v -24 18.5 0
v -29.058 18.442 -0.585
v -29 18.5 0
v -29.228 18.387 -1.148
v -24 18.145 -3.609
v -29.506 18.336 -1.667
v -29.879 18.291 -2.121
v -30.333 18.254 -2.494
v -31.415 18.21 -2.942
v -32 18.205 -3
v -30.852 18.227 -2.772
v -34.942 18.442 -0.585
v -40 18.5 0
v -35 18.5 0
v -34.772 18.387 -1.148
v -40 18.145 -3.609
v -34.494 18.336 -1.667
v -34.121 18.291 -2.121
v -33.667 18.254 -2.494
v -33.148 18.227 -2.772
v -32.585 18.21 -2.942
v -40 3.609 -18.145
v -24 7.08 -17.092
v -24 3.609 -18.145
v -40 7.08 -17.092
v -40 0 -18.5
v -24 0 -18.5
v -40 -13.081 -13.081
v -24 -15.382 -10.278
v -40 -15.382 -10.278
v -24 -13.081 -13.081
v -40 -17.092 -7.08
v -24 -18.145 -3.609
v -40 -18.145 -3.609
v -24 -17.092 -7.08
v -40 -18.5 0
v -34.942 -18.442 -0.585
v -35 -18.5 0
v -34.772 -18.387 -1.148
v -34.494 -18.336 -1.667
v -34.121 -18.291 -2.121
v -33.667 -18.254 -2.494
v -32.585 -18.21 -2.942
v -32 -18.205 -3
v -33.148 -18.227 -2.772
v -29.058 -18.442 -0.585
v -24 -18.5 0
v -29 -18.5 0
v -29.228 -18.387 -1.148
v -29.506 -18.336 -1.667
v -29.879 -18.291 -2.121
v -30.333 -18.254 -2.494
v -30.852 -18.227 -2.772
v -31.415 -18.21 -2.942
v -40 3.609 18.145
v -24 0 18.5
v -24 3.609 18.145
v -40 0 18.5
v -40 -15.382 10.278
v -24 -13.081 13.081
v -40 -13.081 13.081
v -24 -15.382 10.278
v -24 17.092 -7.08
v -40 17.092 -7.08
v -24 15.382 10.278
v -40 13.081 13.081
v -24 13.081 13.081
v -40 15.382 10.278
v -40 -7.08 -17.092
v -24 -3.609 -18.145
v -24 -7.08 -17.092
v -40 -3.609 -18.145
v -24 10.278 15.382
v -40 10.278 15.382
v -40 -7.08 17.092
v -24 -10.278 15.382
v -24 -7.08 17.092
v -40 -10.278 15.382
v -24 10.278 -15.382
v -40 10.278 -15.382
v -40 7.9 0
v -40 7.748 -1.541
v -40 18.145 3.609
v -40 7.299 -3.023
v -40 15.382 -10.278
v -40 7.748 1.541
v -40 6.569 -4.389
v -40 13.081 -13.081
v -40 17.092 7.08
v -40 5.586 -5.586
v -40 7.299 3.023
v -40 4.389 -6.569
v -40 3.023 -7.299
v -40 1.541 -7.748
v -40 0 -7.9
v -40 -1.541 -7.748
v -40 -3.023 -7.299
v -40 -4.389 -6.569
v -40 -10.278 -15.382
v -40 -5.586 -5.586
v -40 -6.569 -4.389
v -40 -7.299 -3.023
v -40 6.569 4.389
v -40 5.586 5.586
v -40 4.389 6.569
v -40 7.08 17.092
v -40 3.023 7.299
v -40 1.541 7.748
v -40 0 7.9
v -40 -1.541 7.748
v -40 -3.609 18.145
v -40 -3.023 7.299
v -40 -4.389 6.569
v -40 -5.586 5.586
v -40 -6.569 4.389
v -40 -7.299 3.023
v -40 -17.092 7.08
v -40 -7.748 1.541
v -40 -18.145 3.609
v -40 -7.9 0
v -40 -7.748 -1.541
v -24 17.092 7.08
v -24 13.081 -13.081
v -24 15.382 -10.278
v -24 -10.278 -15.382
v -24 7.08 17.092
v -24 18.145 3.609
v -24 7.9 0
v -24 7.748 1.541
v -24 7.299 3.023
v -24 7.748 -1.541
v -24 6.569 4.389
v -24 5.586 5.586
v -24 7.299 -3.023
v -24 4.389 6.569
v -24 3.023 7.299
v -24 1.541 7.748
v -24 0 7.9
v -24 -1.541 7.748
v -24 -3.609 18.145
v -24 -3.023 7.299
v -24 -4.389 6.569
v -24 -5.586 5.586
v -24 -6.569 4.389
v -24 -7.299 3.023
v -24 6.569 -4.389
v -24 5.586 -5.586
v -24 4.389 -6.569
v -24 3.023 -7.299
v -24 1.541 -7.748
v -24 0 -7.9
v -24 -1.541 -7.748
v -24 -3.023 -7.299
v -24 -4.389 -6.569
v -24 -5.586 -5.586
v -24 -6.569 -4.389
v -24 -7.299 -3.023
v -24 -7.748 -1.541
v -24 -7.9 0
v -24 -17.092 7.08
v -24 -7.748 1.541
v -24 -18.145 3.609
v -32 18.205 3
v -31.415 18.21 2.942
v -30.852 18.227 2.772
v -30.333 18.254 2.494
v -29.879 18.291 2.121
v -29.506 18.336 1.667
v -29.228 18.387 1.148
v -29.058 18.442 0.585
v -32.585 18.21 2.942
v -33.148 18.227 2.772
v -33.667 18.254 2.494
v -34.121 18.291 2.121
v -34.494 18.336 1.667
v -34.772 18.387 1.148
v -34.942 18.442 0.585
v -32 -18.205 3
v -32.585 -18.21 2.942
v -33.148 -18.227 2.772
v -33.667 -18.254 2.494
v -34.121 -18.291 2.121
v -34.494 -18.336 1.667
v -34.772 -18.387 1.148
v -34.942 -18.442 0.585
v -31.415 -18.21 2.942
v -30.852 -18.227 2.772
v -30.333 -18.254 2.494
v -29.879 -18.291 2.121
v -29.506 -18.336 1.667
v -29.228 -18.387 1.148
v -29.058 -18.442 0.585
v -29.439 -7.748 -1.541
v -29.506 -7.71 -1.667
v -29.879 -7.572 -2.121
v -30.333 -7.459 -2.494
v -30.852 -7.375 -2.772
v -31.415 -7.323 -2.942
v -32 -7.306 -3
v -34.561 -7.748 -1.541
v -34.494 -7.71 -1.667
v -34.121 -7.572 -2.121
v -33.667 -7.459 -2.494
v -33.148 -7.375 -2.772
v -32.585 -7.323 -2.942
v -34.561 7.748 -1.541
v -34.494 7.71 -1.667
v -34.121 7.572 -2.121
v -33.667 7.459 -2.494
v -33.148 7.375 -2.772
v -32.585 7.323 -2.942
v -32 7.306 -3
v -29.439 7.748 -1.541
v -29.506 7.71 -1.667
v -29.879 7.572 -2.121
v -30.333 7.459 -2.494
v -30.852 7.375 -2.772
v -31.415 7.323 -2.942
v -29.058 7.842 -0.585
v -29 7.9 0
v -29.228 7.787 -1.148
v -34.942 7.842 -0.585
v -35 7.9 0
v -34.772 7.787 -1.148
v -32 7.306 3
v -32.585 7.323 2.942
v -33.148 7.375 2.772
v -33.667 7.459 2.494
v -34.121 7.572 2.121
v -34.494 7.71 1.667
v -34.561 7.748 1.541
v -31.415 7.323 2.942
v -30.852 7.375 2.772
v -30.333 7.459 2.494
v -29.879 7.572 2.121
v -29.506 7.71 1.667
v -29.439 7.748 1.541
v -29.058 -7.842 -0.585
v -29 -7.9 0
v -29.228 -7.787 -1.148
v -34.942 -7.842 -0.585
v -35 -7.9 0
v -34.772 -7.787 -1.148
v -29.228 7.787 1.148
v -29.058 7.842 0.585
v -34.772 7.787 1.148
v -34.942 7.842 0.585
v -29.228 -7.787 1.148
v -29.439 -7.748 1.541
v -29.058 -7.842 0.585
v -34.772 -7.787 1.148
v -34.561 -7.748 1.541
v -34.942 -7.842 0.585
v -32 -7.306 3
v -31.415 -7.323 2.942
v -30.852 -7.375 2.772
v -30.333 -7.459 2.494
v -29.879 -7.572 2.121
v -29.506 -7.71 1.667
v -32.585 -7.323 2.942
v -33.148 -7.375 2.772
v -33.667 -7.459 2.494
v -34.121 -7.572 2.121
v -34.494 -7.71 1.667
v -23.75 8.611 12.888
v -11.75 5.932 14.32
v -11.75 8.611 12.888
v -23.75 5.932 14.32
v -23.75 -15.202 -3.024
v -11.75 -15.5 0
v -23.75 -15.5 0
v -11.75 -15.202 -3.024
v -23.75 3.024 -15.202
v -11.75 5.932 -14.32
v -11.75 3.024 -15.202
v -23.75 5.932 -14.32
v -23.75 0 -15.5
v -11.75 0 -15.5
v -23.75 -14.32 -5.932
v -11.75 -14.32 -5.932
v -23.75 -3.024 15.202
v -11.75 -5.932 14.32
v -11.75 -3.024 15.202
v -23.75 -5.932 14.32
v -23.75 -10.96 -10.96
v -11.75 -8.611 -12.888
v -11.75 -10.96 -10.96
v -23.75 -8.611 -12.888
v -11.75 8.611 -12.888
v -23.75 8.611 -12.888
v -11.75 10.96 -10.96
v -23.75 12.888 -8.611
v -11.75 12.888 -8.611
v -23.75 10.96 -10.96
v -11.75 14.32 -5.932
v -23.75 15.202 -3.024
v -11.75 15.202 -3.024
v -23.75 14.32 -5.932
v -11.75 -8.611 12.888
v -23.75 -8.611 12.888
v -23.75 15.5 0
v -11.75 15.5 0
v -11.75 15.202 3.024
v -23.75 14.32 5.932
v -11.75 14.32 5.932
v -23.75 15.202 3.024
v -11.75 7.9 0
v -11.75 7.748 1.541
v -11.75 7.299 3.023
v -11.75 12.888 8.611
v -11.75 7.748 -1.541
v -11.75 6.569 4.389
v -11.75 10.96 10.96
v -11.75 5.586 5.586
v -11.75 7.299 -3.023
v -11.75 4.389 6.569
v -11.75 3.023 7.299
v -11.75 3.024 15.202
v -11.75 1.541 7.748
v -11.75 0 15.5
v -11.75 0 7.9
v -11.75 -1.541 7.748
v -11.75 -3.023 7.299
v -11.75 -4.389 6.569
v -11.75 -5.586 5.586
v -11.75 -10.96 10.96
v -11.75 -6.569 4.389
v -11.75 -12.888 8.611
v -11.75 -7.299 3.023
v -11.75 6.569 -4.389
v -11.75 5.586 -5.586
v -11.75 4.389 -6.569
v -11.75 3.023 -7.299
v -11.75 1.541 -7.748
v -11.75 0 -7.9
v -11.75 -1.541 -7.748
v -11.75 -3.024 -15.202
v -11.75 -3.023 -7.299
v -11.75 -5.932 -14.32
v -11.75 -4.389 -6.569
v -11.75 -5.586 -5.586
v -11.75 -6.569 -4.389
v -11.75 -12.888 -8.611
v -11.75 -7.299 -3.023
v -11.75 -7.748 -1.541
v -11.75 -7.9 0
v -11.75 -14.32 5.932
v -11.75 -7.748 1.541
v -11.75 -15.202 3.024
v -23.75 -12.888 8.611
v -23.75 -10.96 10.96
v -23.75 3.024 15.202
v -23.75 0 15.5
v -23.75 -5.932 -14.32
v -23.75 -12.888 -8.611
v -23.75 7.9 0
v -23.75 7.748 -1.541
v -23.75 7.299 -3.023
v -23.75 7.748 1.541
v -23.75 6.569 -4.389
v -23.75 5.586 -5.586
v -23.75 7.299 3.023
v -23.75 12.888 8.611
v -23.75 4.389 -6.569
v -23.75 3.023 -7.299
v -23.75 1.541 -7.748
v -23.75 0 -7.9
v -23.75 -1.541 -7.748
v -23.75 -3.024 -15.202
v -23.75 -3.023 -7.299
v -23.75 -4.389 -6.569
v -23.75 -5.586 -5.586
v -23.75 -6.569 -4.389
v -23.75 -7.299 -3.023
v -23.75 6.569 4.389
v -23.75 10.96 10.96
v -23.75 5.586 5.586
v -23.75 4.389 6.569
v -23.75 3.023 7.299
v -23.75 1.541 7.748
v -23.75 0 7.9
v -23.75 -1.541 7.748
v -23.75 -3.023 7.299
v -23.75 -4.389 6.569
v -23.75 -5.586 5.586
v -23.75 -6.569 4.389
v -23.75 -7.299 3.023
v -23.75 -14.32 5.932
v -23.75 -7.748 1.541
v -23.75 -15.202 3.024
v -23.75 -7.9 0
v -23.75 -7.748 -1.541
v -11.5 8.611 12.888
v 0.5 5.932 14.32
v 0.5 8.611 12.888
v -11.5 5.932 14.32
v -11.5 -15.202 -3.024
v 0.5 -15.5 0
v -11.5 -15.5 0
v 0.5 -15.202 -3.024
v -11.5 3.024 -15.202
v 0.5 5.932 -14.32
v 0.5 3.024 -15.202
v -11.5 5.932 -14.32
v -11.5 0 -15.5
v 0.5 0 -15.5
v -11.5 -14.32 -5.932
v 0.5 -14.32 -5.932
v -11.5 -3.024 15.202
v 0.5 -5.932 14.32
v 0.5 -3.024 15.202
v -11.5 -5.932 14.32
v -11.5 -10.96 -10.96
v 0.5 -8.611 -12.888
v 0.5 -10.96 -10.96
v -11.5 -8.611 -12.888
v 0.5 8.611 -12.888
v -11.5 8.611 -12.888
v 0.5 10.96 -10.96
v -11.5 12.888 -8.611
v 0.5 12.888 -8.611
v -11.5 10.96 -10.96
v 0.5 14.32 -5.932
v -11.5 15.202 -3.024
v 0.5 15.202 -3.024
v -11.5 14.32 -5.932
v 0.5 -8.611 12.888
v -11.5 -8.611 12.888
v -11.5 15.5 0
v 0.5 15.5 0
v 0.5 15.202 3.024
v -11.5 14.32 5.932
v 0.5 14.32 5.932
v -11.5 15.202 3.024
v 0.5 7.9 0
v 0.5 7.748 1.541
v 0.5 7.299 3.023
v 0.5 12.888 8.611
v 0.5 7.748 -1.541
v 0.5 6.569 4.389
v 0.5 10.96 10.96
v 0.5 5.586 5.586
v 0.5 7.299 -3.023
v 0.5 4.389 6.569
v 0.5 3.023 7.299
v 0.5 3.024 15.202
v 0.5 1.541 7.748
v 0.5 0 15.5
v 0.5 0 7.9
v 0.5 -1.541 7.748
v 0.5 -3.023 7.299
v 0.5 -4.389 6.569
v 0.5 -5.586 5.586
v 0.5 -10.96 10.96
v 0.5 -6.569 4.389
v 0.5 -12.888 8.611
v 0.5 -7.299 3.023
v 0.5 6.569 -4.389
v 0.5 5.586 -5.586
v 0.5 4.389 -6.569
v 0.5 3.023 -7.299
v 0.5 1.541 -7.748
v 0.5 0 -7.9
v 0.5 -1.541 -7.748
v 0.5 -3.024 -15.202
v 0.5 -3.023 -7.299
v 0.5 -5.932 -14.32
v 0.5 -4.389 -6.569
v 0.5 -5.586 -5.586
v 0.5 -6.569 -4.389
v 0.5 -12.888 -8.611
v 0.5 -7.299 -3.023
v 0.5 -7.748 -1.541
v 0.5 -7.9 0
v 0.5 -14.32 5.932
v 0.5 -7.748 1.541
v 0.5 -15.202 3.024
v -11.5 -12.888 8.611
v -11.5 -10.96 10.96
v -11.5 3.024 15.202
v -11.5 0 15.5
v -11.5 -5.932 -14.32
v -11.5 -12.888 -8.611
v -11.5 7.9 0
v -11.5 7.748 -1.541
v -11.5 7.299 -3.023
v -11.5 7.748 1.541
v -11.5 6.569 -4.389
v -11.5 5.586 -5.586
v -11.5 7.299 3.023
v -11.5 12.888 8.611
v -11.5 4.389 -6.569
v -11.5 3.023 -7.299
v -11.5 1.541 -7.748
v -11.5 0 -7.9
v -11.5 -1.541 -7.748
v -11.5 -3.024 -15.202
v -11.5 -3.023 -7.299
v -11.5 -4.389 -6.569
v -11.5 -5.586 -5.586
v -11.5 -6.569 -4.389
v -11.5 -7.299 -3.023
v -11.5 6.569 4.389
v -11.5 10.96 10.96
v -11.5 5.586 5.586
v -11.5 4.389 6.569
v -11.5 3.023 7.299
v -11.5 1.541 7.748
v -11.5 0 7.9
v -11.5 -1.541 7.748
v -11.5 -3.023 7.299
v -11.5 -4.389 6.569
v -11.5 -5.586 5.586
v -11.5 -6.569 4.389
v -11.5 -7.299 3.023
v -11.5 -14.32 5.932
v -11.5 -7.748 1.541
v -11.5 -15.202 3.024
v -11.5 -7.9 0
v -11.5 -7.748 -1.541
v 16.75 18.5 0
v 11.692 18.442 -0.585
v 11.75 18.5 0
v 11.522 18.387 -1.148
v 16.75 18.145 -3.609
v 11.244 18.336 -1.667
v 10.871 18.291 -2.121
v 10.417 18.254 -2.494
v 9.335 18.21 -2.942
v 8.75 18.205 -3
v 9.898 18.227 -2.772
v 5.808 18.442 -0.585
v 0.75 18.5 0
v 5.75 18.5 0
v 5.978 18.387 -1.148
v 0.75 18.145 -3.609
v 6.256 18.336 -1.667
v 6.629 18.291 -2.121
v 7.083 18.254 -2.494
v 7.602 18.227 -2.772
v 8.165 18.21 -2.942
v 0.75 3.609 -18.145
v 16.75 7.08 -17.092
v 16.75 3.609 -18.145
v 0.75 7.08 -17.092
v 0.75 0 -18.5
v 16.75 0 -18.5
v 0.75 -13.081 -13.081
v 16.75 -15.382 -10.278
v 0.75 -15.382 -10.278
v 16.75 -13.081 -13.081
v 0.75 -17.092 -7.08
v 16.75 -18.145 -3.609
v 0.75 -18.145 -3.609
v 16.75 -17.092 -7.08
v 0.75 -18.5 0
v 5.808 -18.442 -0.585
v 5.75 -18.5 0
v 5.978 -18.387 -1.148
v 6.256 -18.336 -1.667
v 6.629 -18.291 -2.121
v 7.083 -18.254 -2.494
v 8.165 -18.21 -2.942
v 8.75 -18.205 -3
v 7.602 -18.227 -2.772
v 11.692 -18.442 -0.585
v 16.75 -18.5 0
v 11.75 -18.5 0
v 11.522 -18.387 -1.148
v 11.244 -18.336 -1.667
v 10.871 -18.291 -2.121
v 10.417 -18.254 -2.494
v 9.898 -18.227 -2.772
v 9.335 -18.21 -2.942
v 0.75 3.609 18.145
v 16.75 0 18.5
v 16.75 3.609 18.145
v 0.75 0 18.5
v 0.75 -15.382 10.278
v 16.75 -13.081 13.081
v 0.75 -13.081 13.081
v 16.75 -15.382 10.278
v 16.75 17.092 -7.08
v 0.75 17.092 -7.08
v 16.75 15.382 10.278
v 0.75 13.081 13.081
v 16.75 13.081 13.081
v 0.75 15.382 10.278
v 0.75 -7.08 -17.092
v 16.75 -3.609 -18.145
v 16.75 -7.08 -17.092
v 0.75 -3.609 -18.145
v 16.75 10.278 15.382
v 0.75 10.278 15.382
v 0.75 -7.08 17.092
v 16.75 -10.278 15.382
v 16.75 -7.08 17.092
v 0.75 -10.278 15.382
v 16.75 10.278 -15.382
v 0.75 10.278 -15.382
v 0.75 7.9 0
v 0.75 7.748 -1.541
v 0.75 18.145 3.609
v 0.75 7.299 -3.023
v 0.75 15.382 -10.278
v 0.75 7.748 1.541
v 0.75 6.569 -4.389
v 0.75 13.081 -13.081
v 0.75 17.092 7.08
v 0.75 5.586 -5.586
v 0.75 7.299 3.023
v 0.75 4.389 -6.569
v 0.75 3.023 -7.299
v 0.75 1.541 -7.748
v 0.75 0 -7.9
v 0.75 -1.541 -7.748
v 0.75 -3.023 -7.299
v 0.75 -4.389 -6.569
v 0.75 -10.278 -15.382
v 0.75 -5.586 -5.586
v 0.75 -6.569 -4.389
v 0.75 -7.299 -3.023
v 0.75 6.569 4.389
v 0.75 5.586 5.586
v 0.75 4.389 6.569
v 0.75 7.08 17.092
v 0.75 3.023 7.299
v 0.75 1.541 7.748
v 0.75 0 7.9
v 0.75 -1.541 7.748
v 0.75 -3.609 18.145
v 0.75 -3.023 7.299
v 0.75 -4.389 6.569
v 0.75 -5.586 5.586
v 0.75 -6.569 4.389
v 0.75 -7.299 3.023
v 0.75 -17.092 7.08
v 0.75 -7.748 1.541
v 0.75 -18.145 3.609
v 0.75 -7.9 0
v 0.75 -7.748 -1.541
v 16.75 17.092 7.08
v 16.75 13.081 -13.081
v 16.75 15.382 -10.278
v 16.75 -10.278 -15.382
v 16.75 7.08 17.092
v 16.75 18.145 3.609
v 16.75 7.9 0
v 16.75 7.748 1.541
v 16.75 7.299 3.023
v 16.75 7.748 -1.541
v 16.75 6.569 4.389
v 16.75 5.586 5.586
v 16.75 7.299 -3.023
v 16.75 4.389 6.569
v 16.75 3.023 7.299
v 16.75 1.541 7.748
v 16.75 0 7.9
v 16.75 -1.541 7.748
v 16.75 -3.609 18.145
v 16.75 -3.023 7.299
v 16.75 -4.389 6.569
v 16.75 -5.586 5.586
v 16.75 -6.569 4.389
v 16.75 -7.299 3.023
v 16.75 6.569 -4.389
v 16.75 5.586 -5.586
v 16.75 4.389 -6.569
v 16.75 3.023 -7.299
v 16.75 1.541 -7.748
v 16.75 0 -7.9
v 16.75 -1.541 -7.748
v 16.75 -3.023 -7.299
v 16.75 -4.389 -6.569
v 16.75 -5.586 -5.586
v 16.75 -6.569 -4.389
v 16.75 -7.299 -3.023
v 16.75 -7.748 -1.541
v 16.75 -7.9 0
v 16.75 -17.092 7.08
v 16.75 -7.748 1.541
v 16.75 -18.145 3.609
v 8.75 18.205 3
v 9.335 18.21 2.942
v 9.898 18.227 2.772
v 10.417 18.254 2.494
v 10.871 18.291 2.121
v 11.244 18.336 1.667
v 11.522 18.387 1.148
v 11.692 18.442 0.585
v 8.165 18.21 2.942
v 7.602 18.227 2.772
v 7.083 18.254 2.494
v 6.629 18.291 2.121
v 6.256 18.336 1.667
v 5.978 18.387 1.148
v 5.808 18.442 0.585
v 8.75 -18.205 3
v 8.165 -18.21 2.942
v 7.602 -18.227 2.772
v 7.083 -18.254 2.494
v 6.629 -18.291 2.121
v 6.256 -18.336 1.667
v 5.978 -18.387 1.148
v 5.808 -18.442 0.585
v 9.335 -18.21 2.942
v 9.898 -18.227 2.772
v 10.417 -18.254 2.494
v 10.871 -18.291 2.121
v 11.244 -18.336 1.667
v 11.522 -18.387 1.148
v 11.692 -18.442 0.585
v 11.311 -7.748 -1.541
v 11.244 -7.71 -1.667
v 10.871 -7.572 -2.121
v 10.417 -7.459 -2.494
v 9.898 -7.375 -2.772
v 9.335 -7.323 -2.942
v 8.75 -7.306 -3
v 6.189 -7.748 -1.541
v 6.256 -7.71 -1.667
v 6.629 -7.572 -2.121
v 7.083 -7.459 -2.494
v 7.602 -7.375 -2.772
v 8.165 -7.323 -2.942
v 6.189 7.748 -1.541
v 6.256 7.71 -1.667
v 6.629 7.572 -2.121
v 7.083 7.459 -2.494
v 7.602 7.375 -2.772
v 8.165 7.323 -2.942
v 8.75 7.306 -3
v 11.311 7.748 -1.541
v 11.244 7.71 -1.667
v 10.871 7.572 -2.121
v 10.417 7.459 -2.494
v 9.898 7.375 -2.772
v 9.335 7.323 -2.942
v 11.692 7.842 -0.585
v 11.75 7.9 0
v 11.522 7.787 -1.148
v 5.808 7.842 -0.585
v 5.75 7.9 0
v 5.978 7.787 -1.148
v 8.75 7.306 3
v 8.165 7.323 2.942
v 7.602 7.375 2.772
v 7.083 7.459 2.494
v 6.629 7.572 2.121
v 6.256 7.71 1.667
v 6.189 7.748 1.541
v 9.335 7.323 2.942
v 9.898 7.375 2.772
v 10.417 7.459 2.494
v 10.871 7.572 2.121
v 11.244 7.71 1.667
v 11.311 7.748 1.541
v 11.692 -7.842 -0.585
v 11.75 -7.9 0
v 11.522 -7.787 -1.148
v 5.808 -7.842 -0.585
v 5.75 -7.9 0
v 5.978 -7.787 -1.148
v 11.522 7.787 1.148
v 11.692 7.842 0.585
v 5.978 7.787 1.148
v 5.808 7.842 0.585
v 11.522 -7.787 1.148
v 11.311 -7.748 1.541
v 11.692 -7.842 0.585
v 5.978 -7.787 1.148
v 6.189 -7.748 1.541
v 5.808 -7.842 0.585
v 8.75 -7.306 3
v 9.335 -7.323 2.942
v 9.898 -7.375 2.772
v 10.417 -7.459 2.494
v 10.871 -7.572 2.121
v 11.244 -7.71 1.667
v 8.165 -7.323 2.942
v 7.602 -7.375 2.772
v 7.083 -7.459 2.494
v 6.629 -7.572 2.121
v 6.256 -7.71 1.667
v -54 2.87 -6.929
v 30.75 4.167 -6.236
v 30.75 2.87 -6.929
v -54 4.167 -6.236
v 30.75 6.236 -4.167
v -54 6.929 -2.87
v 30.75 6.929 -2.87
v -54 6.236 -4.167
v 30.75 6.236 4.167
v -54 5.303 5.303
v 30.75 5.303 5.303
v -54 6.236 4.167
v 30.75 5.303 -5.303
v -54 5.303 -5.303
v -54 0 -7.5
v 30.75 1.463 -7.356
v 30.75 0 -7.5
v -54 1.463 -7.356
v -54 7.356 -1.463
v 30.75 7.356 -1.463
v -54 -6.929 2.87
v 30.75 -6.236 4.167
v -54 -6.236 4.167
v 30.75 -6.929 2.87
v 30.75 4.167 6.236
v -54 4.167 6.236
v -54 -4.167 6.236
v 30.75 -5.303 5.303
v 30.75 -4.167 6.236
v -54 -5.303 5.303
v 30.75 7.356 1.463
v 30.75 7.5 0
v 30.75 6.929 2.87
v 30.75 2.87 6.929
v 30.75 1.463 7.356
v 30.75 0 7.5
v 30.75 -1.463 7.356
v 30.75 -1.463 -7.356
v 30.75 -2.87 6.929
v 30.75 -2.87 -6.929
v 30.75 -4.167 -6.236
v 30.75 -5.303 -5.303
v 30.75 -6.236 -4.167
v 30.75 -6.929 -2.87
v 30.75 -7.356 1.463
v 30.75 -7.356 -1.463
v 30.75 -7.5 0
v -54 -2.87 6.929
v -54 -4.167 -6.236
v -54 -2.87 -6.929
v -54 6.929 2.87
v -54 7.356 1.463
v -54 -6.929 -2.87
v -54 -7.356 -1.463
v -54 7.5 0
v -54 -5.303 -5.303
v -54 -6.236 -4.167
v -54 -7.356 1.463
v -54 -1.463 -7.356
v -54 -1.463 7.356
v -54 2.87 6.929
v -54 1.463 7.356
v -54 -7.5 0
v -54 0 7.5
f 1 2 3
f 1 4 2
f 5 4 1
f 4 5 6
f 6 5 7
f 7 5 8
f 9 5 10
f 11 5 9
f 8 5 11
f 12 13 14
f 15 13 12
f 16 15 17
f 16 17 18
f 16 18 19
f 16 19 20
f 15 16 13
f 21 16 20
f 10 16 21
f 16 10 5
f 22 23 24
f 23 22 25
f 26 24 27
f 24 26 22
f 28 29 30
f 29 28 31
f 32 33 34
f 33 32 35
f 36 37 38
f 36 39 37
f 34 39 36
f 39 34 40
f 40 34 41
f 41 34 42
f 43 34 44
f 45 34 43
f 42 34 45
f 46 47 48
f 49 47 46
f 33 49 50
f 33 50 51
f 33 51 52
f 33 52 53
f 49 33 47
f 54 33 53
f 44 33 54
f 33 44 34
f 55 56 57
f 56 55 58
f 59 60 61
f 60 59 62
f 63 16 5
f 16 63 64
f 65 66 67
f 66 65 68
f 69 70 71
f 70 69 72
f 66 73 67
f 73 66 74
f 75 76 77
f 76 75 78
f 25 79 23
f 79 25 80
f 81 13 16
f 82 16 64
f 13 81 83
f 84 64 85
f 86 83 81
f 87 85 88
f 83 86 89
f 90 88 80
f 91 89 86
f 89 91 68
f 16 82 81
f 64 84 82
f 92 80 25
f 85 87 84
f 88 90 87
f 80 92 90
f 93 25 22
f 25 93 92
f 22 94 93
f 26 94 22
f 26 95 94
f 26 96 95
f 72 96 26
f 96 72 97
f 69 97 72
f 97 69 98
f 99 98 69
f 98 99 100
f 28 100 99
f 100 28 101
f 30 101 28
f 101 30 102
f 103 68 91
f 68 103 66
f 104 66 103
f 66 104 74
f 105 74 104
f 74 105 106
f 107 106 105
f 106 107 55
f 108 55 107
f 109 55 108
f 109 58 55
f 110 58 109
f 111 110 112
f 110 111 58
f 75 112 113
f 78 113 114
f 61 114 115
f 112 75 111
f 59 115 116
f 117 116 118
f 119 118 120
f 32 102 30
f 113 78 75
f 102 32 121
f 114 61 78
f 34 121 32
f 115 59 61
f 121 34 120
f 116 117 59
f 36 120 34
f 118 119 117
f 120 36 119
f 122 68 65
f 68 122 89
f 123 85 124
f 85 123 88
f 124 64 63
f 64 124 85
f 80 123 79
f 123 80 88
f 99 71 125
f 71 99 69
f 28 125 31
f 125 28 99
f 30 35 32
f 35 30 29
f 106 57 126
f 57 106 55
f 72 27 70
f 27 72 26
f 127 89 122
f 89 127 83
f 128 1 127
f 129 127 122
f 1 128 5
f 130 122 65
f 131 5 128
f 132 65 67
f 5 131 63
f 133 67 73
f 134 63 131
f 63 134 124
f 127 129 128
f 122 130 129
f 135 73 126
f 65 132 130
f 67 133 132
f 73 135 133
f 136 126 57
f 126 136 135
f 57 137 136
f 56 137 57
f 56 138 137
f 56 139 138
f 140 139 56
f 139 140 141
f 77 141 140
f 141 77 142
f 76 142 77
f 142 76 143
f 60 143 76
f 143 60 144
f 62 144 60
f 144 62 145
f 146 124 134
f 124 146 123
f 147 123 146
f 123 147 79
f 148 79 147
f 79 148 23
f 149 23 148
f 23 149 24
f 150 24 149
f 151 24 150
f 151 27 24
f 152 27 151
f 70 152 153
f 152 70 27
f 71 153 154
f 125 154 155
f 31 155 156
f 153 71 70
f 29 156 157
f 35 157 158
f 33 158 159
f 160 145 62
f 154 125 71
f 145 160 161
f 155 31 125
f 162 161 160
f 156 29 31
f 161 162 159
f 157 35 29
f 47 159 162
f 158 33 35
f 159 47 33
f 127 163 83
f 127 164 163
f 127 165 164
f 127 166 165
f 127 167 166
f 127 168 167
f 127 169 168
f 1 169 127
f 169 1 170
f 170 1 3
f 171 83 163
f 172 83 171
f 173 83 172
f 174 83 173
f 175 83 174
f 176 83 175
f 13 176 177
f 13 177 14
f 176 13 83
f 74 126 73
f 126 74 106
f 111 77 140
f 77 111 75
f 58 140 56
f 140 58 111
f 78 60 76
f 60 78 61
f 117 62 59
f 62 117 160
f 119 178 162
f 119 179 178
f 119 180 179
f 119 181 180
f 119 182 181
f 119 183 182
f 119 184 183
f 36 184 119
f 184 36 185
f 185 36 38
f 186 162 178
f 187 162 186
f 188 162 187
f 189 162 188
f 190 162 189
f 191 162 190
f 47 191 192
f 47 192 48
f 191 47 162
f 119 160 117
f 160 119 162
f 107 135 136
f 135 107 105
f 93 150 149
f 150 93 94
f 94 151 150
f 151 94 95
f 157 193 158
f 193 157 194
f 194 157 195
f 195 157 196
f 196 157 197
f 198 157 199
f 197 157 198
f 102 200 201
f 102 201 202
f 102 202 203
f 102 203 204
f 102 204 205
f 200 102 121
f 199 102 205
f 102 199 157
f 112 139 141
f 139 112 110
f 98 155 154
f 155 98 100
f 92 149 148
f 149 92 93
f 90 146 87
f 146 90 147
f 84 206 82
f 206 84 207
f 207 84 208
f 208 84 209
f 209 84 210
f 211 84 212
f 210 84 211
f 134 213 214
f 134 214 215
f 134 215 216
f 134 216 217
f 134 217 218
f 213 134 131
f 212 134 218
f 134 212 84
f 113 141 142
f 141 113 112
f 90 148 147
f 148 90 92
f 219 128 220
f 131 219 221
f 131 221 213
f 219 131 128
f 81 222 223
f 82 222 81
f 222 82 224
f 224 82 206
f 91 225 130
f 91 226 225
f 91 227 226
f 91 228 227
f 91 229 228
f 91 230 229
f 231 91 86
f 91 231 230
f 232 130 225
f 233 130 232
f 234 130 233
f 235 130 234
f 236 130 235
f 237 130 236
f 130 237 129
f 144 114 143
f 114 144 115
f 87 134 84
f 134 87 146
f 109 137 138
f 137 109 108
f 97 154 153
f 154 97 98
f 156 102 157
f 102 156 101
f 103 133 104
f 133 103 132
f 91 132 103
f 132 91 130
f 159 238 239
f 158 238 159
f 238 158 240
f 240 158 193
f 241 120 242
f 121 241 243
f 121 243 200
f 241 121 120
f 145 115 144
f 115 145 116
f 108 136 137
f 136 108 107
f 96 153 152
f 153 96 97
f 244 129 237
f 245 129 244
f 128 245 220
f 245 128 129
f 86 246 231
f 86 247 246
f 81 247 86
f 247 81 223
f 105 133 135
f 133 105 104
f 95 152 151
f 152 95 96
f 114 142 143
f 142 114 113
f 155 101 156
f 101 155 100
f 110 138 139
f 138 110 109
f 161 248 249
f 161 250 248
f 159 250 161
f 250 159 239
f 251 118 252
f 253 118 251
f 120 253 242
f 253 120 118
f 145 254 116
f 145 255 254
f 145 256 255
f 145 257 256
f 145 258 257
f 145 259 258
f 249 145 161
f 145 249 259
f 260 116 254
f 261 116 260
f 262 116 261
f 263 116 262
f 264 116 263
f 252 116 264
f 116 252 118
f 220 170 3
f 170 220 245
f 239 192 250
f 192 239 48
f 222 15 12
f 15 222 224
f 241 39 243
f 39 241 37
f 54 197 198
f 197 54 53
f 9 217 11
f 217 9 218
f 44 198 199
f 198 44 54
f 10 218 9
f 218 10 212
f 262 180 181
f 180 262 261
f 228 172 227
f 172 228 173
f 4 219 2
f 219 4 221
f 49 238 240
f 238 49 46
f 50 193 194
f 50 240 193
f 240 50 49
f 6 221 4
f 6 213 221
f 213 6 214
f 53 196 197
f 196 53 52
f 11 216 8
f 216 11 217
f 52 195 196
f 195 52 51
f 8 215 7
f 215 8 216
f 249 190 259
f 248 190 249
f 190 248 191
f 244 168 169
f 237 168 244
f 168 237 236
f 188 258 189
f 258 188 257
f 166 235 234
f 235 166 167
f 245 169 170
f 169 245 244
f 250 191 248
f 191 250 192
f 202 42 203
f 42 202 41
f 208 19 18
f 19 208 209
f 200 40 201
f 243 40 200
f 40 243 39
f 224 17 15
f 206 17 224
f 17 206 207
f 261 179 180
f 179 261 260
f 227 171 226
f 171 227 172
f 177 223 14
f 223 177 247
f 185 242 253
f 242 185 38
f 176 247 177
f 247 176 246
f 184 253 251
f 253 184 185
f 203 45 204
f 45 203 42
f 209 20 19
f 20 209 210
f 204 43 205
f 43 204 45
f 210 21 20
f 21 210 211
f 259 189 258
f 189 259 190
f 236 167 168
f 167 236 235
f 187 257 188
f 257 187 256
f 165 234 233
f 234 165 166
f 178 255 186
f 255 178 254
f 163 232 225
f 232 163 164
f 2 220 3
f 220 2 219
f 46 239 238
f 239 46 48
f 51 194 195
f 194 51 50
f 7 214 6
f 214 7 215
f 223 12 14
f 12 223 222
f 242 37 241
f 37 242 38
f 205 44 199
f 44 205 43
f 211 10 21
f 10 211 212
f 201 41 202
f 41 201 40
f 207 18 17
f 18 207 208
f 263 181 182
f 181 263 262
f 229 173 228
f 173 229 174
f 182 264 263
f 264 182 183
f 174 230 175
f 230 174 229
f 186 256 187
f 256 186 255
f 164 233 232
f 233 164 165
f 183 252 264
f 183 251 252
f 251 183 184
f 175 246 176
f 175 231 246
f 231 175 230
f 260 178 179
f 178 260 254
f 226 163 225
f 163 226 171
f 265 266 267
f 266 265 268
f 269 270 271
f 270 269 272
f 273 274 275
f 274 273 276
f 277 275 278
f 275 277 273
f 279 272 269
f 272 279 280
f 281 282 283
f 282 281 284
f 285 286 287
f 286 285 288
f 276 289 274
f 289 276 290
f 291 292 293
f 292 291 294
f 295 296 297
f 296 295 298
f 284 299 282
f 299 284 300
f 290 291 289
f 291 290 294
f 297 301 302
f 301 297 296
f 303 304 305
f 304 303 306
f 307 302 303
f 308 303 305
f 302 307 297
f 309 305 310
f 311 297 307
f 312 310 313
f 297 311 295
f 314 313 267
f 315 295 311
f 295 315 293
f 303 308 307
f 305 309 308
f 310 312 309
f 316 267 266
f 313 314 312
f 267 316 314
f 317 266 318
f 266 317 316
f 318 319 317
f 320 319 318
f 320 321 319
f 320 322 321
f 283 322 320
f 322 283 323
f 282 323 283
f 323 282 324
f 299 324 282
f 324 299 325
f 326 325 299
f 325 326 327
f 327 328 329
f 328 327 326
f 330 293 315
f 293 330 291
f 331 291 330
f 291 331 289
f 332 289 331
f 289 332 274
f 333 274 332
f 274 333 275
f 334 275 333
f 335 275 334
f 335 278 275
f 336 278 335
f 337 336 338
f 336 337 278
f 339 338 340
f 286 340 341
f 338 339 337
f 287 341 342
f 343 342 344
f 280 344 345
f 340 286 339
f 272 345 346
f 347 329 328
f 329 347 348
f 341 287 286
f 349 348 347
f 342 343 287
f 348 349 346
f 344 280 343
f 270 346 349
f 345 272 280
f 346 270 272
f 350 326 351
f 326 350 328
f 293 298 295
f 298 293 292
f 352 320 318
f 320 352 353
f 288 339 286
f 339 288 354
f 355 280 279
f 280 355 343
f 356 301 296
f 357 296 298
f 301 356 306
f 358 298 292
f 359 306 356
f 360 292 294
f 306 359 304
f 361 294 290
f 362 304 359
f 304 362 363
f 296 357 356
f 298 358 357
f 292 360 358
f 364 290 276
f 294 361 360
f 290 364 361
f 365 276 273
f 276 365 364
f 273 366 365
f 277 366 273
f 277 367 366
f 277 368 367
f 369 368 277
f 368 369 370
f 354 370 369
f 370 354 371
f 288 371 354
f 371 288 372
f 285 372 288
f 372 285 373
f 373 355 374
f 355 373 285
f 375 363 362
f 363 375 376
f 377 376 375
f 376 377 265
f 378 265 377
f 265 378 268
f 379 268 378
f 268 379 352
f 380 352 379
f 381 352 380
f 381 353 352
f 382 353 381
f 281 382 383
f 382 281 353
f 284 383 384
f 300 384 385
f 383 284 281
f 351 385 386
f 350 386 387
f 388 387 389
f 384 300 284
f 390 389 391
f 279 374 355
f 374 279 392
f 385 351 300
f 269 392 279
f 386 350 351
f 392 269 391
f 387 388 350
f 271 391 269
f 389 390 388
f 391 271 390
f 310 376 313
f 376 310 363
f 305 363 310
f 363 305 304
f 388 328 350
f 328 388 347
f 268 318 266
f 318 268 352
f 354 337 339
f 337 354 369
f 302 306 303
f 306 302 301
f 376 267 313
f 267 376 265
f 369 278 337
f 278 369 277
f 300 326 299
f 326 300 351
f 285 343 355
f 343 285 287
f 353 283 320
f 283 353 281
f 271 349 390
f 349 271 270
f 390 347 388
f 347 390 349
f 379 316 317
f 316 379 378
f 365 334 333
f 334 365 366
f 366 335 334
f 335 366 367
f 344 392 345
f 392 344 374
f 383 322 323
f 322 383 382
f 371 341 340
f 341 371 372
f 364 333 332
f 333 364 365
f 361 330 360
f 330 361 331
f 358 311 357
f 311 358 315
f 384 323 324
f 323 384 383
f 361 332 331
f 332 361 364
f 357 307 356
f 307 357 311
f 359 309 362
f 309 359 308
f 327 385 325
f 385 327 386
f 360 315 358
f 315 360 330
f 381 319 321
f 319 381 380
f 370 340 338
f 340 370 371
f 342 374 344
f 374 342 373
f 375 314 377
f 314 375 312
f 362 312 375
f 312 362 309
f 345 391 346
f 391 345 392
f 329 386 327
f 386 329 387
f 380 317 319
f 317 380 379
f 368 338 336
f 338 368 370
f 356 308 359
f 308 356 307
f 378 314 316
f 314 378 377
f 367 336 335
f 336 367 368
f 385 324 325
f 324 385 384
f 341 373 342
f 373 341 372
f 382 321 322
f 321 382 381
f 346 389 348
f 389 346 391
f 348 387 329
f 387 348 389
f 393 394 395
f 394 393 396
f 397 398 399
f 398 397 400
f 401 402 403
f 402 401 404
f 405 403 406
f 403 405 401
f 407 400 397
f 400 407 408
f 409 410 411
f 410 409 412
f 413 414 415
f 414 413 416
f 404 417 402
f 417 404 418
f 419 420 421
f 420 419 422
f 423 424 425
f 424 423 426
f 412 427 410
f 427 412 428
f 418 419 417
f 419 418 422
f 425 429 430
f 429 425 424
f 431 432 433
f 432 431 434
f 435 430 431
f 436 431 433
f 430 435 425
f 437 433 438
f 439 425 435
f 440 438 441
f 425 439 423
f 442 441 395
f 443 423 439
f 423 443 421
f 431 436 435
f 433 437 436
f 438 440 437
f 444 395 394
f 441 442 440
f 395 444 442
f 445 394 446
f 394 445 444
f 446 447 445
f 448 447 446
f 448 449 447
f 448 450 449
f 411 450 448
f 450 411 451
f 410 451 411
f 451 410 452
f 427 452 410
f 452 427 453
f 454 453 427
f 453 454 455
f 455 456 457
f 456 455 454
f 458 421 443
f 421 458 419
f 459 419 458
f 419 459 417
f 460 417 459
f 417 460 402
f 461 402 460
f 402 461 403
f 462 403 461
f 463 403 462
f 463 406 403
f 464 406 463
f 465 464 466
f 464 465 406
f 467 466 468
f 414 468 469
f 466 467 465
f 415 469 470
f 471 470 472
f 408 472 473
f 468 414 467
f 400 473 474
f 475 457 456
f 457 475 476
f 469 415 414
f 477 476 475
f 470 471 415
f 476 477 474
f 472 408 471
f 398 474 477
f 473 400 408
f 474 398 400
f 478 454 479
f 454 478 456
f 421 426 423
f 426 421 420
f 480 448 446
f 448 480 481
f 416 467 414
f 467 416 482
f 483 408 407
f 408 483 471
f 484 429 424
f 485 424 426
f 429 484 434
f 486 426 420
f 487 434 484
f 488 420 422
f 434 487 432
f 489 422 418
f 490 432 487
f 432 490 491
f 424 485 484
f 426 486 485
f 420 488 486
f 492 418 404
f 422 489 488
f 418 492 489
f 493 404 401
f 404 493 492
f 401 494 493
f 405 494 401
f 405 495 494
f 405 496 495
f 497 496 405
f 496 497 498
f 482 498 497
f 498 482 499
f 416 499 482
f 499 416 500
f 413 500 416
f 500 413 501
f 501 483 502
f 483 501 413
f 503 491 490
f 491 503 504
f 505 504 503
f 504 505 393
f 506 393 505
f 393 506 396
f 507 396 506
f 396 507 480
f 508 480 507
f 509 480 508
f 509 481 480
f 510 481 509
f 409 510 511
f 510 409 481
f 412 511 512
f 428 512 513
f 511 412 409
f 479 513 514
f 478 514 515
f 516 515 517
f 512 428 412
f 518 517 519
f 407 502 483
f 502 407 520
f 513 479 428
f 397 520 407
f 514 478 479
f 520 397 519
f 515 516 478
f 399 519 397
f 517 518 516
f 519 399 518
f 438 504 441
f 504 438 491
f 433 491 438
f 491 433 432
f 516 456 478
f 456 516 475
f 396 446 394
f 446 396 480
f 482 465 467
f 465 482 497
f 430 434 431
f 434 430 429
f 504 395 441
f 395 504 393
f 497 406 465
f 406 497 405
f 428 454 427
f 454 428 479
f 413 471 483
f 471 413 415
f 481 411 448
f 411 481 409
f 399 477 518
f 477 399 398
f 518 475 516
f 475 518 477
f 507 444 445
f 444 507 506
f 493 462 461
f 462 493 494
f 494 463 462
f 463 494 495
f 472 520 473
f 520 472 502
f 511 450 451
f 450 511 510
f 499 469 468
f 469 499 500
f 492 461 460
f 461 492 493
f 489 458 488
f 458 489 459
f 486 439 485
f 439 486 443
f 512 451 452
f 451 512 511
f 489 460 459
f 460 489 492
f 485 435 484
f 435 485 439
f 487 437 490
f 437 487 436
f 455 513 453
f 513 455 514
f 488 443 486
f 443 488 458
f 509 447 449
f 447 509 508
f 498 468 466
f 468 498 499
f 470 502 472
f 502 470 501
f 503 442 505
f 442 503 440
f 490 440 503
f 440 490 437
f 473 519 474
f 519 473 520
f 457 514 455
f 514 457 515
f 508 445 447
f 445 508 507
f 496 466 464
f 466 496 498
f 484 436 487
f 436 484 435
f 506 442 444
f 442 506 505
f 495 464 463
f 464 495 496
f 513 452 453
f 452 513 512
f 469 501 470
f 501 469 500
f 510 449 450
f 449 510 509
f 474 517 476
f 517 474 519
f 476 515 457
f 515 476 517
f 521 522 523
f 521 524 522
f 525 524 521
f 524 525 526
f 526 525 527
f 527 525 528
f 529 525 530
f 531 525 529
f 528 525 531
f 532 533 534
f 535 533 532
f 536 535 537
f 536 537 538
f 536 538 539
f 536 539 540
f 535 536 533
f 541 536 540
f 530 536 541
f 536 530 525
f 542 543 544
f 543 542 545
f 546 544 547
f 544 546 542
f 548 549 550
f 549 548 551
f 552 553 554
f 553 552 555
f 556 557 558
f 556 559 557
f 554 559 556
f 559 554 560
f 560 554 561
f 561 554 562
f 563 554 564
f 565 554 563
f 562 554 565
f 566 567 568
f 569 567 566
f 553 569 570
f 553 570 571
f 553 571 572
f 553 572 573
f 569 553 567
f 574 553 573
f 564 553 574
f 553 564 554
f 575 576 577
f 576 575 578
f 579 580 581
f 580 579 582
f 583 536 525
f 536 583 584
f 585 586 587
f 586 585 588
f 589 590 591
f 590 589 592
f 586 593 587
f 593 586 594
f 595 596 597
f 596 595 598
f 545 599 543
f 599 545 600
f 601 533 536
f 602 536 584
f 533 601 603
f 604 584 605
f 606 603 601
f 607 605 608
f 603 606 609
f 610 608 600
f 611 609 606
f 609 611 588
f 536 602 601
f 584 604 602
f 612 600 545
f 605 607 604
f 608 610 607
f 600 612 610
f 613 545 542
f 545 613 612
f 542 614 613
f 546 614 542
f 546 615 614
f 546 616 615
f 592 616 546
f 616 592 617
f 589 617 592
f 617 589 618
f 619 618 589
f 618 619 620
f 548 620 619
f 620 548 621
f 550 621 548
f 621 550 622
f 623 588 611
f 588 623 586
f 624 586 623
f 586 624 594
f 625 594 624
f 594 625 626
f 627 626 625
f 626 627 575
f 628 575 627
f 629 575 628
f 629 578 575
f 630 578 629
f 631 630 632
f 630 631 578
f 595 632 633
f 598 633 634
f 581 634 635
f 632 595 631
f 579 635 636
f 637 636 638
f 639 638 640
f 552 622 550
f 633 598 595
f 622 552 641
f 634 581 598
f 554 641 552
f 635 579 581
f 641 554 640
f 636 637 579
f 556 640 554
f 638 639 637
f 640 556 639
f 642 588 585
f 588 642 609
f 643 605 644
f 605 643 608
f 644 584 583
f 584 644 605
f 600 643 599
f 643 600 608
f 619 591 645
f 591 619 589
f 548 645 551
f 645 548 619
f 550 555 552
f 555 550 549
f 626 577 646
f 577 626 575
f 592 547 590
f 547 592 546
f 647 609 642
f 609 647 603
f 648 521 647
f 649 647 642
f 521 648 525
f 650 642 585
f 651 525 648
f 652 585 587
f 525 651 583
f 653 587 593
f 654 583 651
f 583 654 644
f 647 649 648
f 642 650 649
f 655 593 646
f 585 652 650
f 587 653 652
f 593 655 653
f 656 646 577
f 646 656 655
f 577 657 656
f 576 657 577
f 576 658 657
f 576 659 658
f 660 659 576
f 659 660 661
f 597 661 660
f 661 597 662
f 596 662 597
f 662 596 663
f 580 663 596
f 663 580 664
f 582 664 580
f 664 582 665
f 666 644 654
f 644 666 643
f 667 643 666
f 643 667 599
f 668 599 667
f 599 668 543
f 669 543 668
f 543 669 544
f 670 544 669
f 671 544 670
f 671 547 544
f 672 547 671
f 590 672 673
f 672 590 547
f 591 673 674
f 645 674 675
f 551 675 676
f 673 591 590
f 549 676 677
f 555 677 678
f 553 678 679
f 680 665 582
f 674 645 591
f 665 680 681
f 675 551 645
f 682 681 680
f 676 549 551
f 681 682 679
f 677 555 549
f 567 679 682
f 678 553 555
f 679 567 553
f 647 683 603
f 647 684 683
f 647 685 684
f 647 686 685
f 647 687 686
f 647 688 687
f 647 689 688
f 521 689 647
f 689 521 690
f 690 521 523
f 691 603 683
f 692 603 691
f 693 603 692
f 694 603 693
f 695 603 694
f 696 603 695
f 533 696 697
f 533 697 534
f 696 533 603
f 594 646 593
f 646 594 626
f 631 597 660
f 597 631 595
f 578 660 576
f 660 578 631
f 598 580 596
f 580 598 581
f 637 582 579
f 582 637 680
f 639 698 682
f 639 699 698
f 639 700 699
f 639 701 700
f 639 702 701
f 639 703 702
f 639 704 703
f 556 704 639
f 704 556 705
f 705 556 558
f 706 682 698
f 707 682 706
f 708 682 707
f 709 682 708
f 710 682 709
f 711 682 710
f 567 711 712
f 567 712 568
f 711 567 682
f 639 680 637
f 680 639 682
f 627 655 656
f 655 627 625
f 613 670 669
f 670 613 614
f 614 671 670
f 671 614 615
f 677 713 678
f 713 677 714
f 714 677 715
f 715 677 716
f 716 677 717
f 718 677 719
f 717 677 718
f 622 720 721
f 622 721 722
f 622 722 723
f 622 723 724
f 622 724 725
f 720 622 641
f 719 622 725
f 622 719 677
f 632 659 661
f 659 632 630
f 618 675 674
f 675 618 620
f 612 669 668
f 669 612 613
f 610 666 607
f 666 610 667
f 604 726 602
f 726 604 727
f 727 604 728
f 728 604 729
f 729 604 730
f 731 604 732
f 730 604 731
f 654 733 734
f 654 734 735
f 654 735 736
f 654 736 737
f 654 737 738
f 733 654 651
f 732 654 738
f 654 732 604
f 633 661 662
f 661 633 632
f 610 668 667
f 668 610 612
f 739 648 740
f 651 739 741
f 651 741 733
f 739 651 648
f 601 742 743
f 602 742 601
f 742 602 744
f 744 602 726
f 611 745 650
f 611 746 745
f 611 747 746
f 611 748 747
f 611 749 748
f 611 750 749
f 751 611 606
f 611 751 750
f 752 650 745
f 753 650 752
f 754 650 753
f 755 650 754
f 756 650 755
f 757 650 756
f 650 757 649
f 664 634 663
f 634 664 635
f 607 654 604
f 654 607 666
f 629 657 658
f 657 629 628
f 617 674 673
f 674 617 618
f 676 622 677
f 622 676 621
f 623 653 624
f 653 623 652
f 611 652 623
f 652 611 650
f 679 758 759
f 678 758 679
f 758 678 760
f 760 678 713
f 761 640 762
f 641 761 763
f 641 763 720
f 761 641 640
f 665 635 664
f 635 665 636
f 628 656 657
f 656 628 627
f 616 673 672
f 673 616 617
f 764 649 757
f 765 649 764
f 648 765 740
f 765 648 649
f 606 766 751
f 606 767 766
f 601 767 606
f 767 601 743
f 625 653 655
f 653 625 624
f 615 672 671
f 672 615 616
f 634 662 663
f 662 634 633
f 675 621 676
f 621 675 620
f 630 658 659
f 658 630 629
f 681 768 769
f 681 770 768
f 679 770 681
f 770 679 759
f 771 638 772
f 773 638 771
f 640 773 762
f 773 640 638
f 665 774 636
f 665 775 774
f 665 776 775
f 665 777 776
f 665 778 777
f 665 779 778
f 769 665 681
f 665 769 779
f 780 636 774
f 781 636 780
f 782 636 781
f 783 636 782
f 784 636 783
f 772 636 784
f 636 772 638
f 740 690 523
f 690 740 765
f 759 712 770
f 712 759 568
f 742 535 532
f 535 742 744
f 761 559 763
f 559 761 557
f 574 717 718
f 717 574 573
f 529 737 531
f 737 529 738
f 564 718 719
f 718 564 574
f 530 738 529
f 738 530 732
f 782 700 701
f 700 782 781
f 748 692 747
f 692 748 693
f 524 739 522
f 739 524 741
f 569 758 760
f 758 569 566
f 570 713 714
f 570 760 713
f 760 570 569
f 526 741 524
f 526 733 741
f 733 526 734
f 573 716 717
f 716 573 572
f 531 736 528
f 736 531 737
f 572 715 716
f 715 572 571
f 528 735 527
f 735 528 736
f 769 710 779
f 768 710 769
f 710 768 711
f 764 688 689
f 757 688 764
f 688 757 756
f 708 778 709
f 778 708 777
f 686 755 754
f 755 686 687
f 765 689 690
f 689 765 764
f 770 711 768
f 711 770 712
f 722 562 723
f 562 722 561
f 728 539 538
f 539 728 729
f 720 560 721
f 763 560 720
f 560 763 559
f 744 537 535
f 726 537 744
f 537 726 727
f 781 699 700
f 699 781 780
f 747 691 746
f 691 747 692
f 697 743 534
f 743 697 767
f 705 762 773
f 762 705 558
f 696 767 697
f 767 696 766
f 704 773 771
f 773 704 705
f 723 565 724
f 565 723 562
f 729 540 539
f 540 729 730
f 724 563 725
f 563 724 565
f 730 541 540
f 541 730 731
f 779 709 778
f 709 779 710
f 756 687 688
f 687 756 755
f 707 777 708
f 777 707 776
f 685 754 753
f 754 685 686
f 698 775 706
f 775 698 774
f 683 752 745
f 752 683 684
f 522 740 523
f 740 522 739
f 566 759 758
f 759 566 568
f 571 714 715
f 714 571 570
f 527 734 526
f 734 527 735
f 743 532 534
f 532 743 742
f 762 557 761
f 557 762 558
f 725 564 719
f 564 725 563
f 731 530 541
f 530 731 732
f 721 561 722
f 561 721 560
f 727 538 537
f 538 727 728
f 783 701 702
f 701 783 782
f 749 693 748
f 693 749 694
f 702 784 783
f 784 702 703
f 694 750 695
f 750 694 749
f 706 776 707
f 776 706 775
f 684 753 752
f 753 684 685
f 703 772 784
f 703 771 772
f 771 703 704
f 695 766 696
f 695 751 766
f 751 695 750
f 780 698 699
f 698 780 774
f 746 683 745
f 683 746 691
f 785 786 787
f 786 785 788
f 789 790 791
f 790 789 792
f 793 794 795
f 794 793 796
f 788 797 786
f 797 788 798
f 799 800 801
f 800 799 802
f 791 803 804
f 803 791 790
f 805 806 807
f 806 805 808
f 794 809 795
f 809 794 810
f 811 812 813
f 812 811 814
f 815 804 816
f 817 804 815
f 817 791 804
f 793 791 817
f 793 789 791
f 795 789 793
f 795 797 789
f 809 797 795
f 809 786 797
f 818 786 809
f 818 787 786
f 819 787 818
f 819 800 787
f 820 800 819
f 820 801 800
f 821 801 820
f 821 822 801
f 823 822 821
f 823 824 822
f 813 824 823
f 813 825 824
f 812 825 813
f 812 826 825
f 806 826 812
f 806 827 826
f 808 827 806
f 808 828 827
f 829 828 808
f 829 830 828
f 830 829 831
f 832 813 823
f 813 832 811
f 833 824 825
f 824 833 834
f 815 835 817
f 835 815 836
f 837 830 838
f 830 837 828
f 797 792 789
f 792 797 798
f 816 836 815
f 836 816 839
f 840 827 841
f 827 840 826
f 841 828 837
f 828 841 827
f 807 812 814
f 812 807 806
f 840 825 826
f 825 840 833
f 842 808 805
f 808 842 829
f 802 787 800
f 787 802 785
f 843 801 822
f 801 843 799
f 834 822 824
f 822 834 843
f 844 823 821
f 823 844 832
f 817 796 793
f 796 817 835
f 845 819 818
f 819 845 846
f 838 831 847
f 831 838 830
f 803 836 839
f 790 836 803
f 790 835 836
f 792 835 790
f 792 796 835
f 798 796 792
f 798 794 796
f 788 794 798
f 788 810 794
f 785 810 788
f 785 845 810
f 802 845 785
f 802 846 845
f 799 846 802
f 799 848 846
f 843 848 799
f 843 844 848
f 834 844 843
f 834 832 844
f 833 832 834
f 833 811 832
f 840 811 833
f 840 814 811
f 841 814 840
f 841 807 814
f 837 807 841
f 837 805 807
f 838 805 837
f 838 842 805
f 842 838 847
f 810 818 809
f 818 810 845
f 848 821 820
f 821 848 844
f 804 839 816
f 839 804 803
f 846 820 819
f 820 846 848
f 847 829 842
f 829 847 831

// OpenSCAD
$fn = 32;

// ------------------------------------------------------------------------
// Shaft with rings and collars: d15 shaft, 4 rings
// Every part is its own module, assembly() places them once.
// ------------------------------------------------------------------------

// --- part 1 ---
module shaft() {
  translate([0, 0, -42.375]) cylinder(h = 84.75, d = 15);
}

// --- part 2 ---
module collar_a() {
  difference() {
    cylinder(h = 16, d = 37);
    translate([0, 0, -1]) cylinder(h = 18, d = 15.8);
    translate([0, 0, 8]) rotate([90, 0, 0]) cylinder(h = 39, d = 6, center = true);
  }
}

// --- part 3 ---
module spacer_a() {
  difference() {
      translate([0, 0, 0]) cylinder(h = 12, d = 31);
      translate([0, 0, -1]) cylinder(h = 14, d = 15.8);
    }
}

// --- part 4 ---
module spacer_b() {
  difference() {
      translate([0, 0, 0]) cylinder(h = 12, d = 31);
      translate([0, 0, -1]) cylinder(h = 14, d = 15.8);
    }
}

// --- part 5 ---
module collar_b() {
  difference() {
    cylinder(h = 16, d = 37);
    translate([0, 0, -1]) cylinder(h = 18, d = 15.8);
    translate([0, 0, 8]) rotate([90, 0, 0]) cylinder(h = 39, d = 6, center = true);
  }
}

// --- assembly ---
module assembly() {
  translate([-11.625, 0, 0]) rotate([0, 90, 0]) shaft();
  translate([-40, 0, 0]) rotate([0, 90, 0]) collar_a();
  translate([-23.75, 0, 0]) rotate([0, 90, 0]) spacer_a();
  translate([-11.5, 0, 0]) rotate([0, 90, 0]) spacer_b();
  translate([0.75, 0, 0]) rotate([0, 90, 0]) collar_b();
}

assembly();
